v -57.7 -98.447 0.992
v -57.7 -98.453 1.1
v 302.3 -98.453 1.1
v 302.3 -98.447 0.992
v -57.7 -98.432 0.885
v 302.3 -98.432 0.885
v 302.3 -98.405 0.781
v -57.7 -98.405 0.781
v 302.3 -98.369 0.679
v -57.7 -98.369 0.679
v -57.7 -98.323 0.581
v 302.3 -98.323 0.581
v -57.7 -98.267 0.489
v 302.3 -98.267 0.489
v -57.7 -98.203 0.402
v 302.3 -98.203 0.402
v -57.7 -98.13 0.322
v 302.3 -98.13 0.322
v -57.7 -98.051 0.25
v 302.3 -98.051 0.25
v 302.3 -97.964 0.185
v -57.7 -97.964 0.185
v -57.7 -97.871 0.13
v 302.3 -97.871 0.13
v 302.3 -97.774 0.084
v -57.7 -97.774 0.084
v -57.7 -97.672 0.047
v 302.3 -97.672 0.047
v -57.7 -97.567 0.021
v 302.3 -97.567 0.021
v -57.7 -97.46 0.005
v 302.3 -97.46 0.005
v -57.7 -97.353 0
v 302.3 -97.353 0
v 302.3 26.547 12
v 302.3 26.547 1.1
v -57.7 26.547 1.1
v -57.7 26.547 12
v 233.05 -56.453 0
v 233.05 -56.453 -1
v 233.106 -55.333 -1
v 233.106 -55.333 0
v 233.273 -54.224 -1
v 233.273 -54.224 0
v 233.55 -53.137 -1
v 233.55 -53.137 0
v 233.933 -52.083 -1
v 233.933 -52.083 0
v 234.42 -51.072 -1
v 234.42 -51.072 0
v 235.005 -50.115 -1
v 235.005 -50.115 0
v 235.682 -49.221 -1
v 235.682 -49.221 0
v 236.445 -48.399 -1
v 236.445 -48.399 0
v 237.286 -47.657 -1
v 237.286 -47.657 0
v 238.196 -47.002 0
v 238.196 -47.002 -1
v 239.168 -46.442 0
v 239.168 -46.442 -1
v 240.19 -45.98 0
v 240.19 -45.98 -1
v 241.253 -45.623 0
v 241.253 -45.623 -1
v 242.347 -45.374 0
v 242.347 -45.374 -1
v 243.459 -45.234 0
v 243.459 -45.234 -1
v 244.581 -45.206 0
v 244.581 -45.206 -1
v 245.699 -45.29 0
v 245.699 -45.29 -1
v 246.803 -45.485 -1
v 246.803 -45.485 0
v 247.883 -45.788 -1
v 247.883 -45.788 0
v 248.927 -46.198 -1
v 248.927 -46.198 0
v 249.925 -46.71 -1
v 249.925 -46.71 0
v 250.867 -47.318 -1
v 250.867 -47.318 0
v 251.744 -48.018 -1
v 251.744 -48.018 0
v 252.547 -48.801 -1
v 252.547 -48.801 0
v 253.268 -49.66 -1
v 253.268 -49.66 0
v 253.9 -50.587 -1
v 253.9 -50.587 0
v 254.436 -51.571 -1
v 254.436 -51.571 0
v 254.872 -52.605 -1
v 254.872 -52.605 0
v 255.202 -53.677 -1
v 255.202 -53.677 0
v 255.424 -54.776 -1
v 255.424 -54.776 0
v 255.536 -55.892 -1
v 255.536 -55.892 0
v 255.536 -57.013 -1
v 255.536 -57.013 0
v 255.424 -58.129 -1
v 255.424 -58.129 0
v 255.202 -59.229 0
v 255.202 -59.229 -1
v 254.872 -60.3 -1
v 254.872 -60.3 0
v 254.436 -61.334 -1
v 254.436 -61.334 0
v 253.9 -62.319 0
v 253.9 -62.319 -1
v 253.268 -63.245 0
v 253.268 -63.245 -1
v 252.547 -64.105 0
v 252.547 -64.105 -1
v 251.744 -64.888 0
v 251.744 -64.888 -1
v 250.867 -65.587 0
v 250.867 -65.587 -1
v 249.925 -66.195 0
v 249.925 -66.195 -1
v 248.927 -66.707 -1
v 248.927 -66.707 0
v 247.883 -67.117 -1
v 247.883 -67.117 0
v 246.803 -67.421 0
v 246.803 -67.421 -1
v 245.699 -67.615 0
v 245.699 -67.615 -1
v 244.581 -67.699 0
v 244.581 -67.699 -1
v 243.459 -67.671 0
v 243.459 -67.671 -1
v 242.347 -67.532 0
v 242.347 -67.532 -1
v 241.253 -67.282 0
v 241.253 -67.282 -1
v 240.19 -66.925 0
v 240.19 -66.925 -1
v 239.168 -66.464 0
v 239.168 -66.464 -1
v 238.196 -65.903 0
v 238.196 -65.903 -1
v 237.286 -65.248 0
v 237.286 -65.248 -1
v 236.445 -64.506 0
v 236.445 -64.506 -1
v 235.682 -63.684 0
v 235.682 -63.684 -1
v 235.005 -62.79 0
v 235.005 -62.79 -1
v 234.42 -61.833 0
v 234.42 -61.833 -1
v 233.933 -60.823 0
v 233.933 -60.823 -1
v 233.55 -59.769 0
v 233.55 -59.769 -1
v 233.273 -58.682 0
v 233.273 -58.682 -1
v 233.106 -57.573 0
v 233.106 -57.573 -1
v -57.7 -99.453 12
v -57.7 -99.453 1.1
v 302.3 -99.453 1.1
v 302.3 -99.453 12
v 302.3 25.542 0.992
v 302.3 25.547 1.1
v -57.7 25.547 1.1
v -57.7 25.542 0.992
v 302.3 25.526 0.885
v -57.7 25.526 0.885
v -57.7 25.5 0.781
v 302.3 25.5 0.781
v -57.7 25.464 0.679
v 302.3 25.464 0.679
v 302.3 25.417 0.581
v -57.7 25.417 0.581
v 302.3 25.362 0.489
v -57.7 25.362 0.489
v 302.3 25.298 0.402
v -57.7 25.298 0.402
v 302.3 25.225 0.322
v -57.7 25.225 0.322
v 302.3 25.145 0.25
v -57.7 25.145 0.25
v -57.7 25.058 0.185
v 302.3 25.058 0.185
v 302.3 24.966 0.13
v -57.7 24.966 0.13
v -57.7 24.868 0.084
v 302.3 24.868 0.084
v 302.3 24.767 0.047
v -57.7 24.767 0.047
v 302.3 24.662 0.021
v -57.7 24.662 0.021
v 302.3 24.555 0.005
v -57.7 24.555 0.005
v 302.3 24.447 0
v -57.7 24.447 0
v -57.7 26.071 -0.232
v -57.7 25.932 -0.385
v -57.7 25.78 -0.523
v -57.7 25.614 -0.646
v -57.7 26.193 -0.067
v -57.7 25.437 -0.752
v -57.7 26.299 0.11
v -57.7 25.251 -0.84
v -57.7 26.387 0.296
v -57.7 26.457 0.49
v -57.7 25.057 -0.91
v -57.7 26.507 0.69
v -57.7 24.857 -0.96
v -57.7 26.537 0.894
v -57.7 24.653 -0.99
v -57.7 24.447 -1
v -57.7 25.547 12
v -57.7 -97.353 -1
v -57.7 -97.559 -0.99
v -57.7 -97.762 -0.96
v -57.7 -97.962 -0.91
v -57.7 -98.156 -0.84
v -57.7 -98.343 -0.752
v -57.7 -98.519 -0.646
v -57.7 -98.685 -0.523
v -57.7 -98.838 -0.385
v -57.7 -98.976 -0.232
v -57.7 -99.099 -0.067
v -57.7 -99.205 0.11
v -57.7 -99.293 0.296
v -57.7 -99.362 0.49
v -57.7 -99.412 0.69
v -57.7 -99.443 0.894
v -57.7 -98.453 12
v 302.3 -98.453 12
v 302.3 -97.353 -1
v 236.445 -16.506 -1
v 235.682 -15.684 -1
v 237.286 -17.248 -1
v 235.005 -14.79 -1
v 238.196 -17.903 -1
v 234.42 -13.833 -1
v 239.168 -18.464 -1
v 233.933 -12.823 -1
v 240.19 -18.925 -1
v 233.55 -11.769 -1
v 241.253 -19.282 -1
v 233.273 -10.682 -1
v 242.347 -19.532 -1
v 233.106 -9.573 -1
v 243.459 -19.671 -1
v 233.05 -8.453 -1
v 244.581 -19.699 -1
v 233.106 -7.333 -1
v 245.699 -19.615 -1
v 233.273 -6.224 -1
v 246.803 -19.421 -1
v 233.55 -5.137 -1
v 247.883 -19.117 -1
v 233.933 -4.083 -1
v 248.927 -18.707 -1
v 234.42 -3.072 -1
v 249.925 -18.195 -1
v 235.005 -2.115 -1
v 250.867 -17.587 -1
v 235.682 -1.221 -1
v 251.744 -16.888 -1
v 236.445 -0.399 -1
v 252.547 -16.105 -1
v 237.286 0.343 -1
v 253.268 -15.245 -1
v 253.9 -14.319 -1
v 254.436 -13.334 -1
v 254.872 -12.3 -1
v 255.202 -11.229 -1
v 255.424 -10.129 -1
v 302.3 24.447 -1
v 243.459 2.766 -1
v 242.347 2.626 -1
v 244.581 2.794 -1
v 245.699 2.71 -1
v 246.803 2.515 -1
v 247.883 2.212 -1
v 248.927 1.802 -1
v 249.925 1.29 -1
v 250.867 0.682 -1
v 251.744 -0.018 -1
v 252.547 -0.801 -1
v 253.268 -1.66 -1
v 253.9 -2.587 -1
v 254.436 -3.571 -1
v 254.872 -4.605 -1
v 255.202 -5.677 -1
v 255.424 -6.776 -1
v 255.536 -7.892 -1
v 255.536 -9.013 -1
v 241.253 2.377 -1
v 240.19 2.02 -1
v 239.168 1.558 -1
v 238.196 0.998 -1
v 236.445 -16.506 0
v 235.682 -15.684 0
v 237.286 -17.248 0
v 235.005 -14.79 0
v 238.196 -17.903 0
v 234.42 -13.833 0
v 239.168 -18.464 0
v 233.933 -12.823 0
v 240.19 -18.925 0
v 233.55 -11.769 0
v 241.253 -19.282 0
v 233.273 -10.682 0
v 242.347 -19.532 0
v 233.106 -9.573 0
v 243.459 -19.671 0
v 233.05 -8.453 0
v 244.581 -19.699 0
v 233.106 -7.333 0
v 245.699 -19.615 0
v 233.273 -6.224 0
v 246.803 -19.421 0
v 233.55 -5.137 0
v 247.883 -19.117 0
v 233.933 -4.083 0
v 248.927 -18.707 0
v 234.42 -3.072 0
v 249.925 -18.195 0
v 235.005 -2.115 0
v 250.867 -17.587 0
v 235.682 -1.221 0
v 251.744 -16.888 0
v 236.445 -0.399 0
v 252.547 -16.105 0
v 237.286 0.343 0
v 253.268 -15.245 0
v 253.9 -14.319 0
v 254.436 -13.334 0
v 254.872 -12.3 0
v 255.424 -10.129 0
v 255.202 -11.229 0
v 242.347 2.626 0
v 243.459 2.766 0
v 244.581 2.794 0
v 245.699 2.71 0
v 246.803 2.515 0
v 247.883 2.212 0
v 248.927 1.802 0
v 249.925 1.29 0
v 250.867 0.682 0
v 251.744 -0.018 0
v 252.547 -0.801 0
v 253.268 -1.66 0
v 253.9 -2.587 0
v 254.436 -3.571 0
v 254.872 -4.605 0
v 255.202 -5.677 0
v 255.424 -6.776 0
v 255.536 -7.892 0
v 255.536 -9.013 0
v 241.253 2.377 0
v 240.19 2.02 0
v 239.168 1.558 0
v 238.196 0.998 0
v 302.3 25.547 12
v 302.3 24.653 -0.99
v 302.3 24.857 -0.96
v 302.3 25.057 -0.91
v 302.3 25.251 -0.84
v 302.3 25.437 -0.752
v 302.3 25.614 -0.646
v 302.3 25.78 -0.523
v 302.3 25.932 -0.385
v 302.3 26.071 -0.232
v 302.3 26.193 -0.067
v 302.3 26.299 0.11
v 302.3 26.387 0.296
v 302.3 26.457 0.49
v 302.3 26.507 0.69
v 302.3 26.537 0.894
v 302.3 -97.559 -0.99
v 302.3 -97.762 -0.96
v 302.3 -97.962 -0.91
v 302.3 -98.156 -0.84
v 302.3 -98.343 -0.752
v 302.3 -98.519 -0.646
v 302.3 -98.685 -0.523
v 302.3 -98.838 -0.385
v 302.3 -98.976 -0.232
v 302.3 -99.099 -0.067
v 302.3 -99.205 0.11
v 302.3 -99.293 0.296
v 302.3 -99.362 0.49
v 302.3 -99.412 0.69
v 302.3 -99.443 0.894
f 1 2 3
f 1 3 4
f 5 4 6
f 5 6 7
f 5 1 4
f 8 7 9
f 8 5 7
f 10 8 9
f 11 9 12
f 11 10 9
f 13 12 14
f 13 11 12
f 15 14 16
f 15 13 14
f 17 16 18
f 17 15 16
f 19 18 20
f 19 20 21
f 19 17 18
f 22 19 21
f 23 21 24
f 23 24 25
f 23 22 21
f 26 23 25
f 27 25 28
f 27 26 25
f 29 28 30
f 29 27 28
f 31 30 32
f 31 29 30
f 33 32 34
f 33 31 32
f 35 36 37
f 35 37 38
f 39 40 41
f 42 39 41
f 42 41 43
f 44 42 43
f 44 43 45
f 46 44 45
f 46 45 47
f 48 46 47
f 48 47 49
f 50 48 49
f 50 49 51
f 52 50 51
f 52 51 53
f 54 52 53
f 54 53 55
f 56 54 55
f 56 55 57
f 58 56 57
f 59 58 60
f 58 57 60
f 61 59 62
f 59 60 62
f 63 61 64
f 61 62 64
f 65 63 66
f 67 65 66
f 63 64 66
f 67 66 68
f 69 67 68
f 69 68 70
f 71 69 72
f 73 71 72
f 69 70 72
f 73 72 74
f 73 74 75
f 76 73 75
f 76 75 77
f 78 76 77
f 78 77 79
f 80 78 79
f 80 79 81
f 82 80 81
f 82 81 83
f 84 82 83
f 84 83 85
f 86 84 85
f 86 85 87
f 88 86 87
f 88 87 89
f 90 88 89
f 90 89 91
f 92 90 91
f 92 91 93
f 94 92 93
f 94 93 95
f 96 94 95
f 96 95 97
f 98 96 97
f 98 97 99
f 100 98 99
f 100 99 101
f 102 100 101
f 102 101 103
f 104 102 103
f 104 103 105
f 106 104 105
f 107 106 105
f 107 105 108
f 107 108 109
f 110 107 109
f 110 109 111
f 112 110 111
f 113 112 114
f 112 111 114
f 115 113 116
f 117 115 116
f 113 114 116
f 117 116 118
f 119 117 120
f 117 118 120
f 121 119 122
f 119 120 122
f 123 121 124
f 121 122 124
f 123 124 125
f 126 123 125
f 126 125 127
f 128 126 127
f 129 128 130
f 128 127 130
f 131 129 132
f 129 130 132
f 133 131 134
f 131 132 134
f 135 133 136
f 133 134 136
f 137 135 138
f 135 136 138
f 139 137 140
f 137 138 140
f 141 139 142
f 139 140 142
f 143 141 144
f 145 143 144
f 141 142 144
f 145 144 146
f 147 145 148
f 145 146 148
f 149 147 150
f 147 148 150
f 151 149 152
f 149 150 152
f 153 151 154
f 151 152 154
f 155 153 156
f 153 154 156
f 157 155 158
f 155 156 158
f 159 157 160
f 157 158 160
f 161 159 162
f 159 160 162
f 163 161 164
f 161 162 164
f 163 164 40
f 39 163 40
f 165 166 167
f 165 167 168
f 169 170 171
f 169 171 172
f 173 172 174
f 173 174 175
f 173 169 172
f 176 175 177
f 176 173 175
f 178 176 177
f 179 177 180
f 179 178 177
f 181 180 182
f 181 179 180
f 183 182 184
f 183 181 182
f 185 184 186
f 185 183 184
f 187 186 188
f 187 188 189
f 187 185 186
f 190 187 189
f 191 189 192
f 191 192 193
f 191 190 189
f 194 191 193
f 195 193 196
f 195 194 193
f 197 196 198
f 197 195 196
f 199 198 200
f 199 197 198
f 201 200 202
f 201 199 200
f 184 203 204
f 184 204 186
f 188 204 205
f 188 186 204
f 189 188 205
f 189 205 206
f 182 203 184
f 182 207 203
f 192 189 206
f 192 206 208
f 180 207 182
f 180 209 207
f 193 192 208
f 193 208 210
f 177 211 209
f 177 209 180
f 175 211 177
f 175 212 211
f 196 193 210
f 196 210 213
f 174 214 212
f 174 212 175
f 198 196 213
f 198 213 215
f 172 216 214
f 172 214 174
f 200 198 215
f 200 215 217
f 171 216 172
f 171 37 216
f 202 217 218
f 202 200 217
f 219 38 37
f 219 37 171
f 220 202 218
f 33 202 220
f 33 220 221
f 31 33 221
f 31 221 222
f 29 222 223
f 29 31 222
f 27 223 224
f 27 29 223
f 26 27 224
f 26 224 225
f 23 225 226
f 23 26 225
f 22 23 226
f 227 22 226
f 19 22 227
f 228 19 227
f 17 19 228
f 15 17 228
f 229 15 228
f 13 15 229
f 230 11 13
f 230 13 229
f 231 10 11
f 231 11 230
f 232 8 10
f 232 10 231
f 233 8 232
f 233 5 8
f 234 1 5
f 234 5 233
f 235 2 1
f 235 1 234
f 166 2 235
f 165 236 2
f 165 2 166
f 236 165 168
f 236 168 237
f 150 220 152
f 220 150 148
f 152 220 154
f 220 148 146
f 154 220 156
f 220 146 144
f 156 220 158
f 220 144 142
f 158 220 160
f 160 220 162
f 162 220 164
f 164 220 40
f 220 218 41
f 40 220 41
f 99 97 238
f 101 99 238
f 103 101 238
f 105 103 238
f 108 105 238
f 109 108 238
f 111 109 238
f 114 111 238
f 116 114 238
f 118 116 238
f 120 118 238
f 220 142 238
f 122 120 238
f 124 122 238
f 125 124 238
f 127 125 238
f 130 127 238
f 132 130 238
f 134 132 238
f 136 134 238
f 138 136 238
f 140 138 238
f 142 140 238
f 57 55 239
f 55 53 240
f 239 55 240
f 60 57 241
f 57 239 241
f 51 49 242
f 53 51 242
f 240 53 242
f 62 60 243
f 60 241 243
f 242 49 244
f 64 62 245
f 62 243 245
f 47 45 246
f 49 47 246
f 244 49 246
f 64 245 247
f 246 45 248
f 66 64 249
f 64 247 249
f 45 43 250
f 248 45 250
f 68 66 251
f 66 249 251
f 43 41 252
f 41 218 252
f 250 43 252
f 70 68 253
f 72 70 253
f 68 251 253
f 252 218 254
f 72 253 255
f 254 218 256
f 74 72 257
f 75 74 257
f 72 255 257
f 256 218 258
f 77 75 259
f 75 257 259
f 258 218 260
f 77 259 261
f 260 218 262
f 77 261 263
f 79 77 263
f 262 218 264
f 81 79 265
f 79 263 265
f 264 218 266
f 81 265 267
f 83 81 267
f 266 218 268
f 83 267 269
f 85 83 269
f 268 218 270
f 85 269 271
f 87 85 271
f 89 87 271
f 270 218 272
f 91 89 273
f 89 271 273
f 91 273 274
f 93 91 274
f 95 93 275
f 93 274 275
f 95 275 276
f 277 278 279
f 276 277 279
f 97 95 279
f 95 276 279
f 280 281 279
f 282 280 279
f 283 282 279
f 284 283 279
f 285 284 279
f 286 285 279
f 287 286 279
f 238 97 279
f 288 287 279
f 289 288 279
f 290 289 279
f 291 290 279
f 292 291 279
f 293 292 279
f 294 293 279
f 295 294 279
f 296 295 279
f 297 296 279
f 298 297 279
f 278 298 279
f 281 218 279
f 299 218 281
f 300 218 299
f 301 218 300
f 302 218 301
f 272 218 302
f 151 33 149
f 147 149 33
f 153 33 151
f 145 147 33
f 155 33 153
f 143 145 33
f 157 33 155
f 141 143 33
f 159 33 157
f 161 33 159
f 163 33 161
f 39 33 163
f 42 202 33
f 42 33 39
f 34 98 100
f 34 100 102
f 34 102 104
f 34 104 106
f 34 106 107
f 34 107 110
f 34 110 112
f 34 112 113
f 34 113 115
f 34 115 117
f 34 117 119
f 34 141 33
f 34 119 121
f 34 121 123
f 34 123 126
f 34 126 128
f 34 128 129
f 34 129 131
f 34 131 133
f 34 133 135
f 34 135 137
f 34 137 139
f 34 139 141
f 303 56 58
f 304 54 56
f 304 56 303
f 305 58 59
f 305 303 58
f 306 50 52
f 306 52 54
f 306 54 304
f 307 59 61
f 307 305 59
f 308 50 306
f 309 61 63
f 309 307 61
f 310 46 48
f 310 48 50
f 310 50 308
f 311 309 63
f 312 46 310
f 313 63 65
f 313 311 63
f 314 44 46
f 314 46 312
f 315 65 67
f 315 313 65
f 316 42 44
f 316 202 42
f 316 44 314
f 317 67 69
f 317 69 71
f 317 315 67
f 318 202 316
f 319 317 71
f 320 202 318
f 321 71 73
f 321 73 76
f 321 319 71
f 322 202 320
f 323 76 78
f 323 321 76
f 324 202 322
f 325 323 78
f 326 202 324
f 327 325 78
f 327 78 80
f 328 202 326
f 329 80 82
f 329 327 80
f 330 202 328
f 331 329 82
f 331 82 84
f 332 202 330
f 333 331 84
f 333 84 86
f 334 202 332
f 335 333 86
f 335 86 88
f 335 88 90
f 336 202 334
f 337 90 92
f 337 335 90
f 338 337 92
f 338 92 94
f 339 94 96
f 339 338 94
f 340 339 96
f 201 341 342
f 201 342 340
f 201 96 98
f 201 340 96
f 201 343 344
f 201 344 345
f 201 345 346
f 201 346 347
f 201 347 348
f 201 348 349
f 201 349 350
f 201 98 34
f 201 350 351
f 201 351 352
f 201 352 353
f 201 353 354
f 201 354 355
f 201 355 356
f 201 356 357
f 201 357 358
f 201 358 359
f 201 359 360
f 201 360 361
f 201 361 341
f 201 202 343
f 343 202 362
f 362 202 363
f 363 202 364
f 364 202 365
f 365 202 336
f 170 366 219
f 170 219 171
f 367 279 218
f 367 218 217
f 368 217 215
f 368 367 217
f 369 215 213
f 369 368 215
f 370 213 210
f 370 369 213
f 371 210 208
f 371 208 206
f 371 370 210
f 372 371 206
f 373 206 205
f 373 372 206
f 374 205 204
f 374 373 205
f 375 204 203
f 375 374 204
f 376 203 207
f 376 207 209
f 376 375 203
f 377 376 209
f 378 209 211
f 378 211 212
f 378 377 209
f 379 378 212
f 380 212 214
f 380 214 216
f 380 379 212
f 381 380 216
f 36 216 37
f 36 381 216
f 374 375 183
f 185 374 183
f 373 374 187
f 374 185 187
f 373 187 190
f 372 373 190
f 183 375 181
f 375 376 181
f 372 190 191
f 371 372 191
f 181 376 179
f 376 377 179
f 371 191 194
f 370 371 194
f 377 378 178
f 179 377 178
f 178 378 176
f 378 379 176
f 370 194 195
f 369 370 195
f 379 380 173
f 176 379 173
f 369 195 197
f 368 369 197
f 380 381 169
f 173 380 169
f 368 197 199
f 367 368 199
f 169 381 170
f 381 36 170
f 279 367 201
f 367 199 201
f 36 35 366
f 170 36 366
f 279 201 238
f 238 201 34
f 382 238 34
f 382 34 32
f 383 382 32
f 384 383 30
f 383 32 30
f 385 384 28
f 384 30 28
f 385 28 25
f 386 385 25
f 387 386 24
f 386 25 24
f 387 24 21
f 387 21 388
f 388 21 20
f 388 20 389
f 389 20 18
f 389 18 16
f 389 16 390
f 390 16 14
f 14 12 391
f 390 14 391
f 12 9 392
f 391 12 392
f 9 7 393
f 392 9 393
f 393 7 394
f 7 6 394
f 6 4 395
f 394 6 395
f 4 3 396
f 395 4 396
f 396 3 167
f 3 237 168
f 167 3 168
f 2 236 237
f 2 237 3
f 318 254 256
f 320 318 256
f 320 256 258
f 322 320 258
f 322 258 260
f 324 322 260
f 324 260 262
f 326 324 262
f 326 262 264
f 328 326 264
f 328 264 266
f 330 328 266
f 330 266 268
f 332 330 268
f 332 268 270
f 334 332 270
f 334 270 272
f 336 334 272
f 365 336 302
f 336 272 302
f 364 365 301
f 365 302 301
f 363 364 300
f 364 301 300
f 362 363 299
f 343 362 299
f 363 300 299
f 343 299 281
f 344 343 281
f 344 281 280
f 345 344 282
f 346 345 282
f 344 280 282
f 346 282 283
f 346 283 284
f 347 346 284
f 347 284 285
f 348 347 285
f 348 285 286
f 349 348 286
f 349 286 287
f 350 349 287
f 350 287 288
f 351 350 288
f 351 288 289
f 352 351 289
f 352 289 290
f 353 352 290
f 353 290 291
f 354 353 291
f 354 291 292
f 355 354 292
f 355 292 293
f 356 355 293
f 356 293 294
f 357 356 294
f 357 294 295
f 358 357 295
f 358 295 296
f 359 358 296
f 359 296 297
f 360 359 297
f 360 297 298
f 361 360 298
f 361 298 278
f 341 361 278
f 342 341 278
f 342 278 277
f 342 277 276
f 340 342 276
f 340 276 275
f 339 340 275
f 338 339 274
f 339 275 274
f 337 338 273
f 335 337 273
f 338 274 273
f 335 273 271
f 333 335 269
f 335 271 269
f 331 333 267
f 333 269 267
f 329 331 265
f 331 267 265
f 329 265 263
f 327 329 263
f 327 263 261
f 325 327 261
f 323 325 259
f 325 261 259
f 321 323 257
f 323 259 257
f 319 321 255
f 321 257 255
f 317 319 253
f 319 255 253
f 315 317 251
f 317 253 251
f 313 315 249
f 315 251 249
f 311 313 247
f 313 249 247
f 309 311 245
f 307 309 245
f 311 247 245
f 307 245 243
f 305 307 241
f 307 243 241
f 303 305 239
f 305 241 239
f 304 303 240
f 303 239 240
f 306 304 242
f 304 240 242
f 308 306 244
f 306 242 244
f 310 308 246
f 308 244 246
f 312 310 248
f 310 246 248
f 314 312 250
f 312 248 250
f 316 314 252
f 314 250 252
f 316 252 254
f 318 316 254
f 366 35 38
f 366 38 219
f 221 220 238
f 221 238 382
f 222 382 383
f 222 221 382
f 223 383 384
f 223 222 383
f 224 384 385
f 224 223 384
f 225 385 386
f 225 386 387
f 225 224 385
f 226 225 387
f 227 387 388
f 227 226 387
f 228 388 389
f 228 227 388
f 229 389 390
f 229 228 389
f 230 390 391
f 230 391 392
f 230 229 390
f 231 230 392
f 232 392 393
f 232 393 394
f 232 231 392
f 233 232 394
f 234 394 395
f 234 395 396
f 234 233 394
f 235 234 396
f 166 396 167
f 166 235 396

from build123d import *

# Parameters (mm, degrees)
SKETCH_1_W                         = 360
SKETCH_1_H                         = 124
SM_BASE_FLANGE_1_DEPTH             = 1
SM_EDGE_FLANGE_1_STRIP_W           = 6.2
SM_EDGE_FLANGE_1_STRIP_H           = 1
SM_EDGE_FLANGE_1_STRIP_CUT_DEPTH   = 360
SM_EDGE_FLANGE_1_STRIP_2_W         = 6.2
SM_EDGE_FLANGE_1_STRIP_2_H         = 1
SM_EDGE_FLANGE_1_STRIP_CUT_2_DEPTH = 360
SM_EDGE_FLANGE_1_DEPTH             = 360
SM_EDGE_FLANGE_1_BEND_DEPTH        = 360
SKETCH_8_R                         = 11.25
CUT_EXTRUDE_1_DEPTH                = 10


# Sheet-metal steps are written as plain solids
with BuildPart() as part:
    # Sketch 1 → Базовая кромка1 (new body)
    with BuildSketch(Plane.XY):
        with Locations((122.300049421, -36.452668213)):
            Rectangle(SKETCH_1_W, SKETCH_1_H)
    extrude(amount=-SM_BASE_FLANGE_1_DEPTH)

    # Ребро-кромка1 strip (across the edge) → Ребро-кромка1 strip cut (cut)
    with BuildSketch(Plane(origin=(302.300049421, 25.547331787, 0), x_dir=(0, -1, 0), z_dir=(-1, 0, 0))):
        with Locations((-2, -0.5)):
            Rectangle(SM_EDGE_FLANGE_1_STRIP_W, SM_EDGE_FLANGE_1_STRIP_H)
    extrude(amount=SM_EDGE_FLANGE_1_STRIP_CUT_DEPTH, mode=Mode.SUBTRACT)

    # Ребро-кромка1 strip 2 (across the edge) → Ребро-кромка1 strip cut 2 (cut)
    with BuildSketch(Plane(origin=(-57.699950579, -98.452668213, 0), x_dir=(0, 1, 0), z_dir=(1, 0, 0))):
        with Locations((-2, -0.5)):
            Rectangle(SM_EDGE_FLANGE_1_STRIP_2_W, SM_EDGE_FLANGE_1_STRIP_2_H)
    extrude(amount=SM_EDGE_FLANGE_1_STRIP_CUT_2_DEPTH, mode=Mode.SUBTRACT)

    # Ребро-кромка1 section (across the edge) → Ребро-кромка1 (add)
    with BuildSketch(Plane(origin=(302.300049421, 25.547331787, 0), x_dir=(0, -1, 0), z_dir=(-1, 0, 0))):
        with BuildLine():
            Line((-1, 1.1), (-1, 12))
            Line((-1, 12), (0, 12))
            Line((0, 12), (0, 1.1))
            ThreePointArc((0, 1.1), (0.322182541, 0.322182541), (1.1, 0))
            Line((1.1, 0), (1.1, -1))
            ThreePointArc((1.1, -1), (-0.38492424, -0.38492424), (-1, 1.1))
        make_face()
    extrude(amount=SM_EDGE_FLANGE_1_DEPTH)

    # Ребро-кромка1 section 2 (across the edge) → Ребро-кромка1 bend (add)
    with BuildSketch(Plane(origin=(-57.699950579, -98.452668213, 0), x_dir=(0, 1, 0), z_dir=(1, 0, 0))):
        with BuildLine():
            Line((-1, 1.1), (-1, 12))
            Line((-1, 12), (0, 12))
            Line((0, 12), (0, 1.1))
            ThreePointArc((0, 1.1), (0.322182541, 0.322182541), (1.1, 0))
            Line((1.1, 0), (1.1, -1))
            ThreePointArc((1.1, -1), (-0.38492424, -0.38492424), (-1, 1.1))
        make_face()
    extrude(amount=SM_EDGE_FLANGE_1_BEND_DEPTH)

    # Эскиз8 → Вырез-Вытянуть1 (cut)
    with BuildSketch(Plane(origin=(0, 0, -1), x_dir=(-1, 0, 0), z_dir=(0, 0, -1))):
        with Locations((-244.300049421, -8.452668213)):
            Circle(SKETCH_8_R)
        with Locations((-244.300049421, -56.452668213)):
            Circle(SKETCH_8_R)
    extrude(amount=-CUT_EXTRUDE_1_DEPTH, mode=Mode.SUBTRACT)


solid = part.part
